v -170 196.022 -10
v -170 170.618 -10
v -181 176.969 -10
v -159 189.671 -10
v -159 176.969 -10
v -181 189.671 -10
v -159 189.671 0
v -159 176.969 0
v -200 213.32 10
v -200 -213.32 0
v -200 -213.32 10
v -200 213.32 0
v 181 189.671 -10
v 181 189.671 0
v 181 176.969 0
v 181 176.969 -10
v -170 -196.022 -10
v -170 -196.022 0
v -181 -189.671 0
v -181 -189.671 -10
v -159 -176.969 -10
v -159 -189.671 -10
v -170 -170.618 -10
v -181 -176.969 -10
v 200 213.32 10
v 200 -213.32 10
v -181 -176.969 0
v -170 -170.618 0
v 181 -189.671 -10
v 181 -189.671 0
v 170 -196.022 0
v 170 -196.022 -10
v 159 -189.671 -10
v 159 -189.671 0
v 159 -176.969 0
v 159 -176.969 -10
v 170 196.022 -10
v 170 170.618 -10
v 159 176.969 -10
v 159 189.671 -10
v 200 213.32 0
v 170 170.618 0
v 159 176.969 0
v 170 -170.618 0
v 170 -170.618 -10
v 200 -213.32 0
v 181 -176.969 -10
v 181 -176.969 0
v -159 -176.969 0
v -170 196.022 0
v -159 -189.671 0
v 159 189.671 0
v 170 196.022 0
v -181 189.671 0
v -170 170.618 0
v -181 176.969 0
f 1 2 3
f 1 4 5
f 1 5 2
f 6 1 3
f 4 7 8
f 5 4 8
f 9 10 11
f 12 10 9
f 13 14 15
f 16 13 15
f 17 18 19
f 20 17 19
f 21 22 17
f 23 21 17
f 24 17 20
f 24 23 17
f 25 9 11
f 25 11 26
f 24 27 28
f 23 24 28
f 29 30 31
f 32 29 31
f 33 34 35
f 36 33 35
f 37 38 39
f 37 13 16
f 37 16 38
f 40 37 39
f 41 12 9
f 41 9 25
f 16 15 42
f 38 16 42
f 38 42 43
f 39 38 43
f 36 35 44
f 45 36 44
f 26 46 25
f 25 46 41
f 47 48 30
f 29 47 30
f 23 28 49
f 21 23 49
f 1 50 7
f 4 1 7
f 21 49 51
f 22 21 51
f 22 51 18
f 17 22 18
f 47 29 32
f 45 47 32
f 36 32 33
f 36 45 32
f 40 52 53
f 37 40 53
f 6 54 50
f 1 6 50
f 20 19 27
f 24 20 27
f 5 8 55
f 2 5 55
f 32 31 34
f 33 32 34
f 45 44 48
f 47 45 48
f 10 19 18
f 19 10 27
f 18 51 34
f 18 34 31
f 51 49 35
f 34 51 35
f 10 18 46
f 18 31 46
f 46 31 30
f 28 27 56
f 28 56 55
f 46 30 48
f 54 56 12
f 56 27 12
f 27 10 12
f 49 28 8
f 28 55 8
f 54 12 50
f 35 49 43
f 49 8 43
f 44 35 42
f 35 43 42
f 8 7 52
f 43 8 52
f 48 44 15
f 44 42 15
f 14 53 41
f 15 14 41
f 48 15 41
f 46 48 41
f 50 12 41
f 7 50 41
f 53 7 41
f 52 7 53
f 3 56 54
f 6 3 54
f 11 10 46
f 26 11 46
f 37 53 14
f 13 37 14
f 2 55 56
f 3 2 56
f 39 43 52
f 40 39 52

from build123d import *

# Parameters (mm, degrees)
CROQUIS1_W              = 400
CROQUIS1_H              = 426.64
SALIENTE_EXTRUIR1_DEPTH = 10
SALIENTE_EXTRUIR2_DEPTH = 10


with BuildPart() as part:
    # Croquis1 → Saliente-Extruir1 (new body)
    with BuildSketch(Plane.XY):
        Rectangle(CROQUIS1_W, CROQUIS1_H)
    extrude(amount=SALIENTE_EXTRUIR1_DEPTH)

    # Croquis2 → Saliente-Extruir2 (add)
    with BuildSketch(Plane(origin=(0, 0, 0), x_dir=(-1, 0, 0), z_dir=(0, 0, -1))):
        Polygon((-170, 170.618294078), (-159, 176.969147039), (-159, 189.670852961), (-170, 196.021705922), (-181, 189.670852961), (-181, 176.969147039), align=None)
        Polygon((-170, -170.618294078), (-181, -176.969147039), (-181, -189.670852961), (-170, -196.021705922), (-159, -189.670852961), (-159, -176.969147039), align=None)
        Polygon((170, 170.618294078), (181, 176.969147039), (181, 189.670852961), (170, 196.021705922), (159, 189.670852961), (159, 176.969147039), align=None)
        Polygon((170, -170.618294078), (159, -176.969147039), (159, -189.670852961), (170, -196.021705922), (181, -189.670852961), (181, -176.969147039), align=None)
    extrude(amount=SALIENTE_EXTRUIR2_DEPTH)


solid = part.part
